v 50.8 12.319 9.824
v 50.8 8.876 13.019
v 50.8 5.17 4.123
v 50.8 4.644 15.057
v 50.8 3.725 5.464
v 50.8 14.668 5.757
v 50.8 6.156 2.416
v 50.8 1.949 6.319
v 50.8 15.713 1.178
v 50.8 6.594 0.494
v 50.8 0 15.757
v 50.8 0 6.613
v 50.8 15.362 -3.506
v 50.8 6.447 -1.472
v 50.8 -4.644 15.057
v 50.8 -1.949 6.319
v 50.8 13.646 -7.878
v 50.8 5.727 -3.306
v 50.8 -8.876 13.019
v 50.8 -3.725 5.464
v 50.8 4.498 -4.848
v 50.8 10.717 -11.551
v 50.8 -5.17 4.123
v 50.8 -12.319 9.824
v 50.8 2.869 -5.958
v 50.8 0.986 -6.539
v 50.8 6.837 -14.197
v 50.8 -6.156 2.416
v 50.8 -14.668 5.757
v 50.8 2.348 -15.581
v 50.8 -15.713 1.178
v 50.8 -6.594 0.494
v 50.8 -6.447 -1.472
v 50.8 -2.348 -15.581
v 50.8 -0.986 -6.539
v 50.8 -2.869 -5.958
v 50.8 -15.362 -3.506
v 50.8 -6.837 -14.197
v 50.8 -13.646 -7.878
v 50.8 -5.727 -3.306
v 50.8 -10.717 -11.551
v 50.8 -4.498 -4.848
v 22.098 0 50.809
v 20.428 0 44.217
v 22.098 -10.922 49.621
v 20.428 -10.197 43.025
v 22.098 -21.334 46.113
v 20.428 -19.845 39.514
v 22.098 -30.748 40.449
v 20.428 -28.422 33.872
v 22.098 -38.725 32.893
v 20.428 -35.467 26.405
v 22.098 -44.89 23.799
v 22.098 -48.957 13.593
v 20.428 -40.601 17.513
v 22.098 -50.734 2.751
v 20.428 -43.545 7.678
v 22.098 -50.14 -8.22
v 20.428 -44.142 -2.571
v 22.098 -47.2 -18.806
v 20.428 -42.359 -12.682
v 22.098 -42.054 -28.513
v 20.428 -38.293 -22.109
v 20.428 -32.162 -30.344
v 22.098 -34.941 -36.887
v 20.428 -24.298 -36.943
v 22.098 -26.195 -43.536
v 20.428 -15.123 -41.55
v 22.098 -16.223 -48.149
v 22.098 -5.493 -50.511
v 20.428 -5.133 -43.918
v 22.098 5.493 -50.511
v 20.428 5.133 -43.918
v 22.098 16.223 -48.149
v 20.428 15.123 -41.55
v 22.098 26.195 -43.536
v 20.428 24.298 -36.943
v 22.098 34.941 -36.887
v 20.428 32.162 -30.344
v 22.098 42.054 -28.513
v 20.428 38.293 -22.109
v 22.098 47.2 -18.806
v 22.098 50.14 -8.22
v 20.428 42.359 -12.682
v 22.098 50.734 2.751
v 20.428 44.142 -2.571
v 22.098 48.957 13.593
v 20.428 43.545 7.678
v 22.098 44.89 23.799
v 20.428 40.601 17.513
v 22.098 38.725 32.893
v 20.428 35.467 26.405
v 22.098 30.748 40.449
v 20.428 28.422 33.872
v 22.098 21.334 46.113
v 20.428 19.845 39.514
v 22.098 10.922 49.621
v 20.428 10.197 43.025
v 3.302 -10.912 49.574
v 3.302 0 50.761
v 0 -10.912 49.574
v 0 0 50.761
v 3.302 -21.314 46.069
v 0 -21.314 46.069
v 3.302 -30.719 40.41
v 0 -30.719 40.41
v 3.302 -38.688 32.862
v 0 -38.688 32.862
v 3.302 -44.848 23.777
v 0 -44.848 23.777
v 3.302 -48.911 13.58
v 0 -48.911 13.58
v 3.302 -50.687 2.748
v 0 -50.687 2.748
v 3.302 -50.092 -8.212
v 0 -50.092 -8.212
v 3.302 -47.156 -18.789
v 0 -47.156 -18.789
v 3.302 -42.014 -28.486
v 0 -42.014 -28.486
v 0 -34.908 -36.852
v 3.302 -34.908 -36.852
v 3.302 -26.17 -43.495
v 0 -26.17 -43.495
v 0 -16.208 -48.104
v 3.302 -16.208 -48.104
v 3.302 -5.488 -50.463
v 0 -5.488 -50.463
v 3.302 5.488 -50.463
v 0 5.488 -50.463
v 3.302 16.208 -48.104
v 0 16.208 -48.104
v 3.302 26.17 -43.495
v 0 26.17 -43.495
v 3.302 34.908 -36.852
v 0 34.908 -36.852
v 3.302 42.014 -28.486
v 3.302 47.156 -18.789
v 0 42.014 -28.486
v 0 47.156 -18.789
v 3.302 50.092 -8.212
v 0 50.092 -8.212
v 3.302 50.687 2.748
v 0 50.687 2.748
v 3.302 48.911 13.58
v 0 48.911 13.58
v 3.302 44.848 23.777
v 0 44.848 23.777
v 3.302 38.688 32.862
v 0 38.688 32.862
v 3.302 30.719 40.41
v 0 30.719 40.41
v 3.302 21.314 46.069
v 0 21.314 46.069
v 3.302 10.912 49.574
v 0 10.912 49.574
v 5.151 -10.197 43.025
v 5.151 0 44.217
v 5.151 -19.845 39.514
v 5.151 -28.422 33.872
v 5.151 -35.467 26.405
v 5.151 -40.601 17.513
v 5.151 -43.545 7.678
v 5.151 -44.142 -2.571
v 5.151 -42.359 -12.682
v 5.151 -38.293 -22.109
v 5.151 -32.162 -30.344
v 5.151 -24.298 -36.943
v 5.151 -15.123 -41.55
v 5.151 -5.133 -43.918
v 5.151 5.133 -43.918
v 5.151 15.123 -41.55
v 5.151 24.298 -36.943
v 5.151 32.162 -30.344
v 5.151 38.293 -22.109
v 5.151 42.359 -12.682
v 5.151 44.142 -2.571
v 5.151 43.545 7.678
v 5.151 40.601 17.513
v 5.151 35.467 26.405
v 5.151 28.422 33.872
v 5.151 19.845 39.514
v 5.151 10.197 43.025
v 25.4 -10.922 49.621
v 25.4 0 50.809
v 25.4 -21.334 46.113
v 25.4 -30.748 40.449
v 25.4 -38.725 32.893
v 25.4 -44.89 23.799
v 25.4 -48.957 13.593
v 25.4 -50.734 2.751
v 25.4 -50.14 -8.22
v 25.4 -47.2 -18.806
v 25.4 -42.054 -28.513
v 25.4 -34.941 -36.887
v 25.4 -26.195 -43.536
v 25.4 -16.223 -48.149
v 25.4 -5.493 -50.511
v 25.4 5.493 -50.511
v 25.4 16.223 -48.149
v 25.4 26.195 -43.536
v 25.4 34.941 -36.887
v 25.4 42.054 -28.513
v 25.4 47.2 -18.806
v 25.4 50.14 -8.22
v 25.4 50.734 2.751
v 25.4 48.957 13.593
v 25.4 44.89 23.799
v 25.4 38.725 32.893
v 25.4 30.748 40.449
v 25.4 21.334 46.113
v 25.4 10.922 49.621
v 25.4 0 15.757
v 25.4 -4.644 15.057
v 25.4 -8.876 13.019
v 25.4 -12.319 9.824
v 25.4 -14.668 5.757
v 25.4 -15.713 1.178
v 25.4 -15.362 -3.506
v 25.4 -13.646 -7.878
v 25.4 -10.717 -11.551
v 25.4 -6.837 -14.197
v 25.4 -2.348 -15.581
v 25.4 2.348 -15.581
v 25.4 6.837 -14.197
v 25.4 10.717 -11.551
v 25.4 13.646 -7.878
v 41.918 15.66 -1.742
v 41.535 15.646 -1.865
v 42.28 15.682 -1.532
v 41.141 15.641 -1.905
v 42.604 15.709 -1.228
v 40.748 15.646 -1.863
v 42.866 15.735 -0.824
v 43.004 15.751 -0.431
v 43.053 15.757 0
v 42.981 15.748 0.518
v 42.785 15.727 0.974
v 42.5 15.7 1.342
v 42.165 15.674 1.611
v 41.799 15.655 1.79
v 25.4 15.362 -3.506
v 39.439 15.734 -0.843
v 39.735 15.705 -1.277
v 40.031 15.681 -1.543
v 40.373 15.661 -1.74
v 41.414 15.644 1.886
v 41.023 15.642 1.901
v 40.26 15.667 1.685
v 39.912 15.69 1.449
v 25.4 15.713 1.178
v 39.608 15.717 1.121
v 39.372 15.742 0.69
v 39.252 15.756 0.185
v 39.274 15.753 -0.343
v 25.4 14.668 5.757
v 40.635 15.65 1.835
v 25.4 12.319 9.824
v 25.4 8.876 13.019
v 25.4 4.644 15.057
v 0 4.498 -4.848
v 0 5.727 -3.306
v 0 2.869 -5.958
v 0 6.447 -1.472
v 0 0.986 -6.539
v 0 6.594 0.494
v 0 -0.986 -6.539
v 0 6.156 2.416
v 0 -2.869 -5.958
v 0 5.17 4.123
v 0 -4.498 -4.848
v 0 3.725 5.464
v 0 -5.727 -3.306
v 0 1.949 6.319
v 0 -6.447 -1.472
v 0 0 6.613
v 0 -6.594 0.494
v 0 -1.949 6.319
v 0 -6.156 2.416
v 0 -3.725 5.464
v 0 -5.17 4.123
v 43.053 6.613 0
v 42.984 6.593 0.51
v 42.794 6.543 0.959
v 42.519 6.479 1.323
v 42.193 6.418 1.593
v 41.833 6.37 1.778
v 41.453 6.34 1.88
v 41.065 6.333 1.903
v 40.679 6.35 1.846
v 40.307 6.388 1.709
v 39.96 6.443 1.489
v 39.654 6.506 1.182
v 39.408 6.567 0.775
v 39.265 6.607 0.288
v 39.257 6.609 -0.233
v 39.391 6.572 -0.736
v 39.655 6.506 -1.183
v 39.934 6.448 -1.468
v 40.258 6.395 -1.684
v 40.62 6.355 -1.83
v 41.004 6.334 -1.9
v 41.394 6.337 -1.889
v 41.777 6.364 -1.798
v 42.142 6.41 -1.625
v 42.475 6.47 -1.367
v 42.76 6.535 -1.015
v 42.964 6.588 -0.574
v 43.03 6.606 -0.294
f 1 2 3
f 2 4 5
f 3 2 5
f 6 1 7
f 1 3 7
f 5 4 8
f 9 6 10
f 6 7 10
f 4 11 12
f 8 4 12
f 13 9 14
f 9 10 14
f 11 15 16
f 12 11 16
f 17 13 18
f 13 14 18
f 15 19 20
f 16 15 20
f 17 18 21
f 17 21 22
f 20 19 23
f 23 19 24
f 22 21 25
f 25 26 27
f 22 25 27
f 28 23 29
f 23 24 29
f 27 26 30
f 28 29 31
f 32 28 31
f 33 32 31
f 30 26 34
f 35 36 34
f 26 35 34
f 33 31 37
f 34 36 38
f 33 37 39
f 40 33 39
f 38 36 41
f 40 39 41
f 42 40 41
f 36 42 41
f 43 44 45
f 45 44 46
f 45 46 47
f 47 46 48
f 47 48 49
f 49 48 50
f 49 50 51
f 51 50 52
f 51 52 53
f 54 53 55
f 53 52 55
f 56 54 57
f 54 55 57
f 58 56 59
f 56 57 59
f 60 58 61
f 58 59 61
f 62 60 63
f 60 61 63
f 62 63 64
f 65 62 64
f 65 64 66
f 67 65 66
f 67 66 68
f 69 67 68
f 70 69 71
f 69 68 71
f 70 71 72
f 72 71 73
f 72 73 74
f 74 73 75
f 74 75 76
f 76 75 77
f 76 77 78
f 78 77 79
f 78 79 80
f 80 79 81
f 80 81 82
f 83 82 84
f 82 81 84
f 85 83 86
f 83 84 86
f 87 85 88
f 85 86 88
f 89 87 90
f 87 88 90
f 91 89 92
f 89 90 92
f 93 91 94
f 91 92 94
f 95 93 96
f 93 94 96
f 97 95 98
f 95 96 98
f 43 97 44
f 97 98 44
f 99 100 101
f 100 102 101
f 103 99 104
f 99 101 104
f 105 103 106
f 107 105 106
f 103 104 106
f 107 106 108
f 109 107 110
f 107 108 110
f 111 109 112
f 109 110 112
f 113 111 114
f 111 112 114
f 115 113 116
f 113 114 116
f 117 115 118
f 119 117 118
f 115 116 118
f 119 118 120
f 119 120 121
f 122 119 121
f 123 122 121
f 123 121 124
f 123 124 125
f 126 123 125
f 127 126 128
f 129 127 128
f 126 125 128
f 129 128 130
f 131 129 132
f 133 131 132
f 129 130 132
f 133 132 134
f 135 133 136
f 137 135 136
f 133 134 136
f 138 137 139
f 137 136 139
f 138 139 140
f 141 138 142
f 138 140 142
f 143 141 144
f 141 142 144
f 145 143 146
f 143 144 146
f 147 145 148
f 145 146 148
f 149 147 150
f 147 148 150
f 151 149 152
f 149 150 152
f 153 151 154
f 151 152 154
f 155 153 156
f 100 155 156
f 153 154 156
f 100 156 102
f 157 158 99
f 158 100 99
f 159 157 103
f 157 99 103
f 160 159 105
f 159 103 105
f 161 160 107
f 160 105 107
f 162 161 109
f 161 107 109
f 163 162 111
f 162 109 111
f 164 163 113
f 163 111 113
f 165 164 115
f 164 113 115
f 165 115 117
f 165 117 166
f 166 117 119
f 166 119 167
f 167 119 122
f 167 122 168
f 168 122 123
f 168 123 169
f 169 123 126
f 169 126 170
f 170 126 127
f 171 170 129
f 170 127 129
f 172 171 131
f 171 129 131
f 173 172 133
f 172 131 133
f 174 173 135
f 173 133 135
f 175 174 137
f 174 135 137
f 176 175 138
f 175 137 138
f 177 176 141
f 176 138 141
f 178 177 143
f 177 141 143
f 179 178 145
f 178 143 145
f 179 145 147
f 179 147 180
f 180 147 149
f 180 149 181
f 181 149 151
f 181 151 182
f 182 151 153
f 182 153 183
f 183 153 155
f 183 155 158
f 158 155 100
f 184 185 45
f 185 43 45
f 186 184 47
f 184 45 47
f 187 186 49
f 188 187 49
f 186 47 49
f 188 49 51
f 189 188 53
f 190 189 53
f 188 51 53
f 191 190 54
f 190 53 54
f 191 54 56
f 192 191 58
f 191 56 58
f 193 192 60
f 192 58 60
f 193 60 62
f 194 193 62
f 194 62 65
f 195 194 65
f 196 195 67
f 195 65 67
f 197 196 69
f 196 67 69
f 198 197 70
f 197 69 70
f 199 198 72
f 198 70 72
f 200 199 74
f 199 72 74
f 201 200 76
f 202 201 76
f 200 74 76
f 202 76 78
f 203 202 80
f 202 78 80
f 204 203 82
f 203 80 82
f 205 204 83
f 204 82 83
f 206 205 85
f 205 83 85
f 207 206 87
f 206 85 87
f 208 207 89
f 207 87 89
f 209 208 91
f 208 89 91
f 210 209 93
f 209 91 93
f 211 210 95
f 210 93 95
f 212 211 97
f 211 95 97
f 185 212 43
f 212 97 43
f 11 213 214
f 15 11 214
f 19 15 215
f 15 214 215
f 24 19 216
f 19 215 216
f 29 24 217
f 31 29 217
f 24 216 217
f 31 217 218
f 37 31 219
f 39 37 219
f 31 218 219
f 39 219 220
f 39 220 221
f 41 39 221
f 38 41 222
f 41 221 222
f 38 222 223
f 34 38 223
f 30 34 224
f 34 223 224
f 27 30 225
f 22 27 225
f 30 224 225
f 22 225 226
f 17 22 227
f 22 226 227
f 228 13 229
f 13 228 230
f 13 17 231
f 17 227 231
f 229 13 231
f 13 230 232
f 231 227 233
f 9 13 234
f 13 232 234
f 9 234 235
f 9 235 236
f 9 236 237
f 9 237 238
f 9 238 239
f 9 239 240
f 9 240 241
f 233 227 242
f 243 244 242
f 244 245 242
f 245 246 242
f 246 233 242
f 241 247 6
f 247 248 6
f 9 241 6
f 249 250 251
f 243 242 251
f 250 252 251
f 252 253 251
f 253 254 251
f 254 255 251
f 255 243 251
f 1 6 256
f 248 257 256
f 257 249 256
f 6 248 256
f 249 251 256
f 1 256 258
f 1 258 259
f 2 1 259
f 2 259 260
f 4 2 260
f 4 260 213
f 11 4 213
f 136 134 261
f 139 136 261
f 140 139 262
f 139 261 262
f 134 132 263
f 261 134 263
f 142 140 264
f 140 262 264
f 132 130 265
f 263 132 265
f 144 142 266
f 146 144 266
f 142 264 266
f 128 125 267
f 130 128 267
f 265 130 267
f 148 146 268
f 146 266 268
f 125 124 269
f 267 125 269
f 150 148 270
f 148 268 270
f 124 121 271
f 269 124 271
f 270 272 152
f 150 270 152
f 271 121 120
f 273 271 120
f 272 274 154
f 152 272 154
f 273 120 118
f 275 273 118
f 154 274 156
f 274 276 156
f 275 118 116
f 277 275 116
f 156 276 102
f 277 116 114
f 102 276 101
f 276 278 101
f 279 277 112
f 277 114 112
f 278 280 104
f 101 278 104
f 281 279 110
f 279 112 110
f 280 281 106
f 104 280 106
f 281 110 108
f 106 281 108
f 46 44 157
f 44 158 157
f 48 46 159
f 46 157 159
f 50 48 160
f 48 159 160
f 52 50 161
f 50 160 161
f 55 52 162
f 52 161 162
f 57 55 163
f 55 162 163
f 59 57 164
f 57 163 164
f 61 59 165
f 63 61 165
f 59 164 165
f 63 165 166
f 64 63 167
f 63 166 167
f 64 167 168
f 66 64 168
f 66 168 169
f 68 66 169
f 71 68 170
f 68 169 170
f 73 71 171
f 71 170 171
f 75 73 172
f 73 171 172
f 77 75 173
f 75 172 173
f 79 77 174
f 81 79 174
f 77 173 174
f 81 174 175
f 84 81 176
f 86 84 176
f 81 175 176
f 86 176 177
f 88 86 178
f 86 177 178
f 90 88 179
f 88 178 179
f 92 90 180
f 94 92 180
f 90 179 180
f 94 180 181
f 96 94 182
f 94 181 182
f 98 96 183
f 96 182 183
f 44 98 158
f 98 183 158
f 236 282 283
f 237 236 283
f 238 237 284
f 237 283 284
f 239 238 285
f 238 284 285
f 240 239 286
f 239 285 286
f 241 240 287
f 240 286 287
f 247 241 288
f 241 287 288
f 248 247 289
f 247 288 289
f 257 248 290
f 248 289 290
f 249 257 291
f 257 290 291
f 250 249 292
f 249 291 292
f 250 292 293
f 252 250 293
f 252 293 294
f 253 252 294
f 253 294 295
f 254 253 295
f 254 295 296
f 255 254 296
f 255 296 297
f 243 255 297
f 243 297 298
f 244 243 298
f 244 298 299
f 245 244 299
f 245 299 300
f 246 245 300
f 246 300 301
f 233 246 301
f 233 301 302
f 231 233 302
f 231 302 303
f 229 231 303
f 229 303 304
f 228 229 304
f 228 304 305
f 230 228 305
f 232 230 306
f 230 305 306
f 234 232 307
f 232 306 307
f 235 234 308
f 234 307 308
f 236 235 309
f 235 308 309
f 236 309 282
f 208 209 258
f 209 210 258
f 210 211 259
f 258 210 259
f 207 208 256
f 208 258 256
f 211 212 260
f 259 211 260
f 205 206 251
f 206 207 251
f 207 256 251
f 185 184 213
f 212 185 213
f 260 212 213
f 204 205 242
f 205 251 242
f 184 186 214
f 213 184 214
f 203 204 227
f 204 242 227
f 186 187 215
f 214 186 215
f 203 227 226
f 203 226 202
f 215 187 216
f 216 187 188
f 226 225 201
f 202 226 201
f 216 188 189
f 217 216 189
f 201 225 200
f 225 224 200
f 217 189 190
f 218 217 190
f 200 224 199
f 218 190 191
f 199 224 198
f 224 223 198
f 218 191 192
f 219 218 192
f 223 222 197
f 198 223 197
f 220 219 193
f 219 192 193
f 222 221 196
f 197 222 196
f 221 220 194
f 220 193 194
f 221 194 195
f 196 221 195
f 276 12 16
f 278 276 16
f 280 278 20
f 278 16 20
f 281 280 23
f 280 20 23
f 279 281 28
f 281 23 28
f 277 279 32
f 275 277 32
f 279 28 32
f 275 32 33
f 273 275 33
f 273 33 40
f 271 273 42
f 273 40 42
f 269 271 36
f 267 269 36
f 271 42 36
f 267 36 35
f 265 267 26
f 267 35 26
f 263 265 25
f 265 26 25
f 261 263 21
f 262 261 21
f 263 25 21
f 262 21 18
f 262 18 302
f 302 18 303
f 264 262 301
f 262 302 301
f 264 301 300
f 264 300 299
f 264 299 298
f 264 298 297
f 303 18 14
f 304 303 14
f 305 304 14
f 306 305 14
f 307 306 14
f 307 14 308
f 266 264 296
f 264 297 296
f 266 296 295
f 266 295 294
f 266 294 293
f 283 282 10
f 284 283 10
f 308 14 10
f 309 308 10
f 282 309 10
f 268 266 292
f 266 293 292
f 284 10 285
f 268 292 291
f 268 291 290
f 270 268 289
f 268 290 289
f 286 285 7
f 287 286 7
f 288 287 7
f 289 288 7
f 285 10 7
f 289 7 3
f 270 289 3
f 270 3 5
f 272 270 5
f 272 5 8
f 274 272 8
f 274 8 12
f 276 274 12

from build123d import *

# Parameters (mm, degrees)
F2_R     = 1.905
F3_DEPTH = 25.4


with BuildPart() as f1:
    # F0 (on Front) → F1 (revolve)
    with BuildSketch(Plane.XZ):
        Polygon((0, 50.761004), (0, 6.612969), (50.8, 6.612969), (50.8, 15.756969), (25.4, 15.756969), (25.4, 50.808969), (22.098, 50.808969), (20.42762, 44.217008), (5.151389, 44.217008), (3.302, 50.761004), align=None)
    revolve(axis=Axis((50.224784, 0, 0), (1, 0, 0)))

    # F2 (on Front) → F3 (cut)
    with BuildSketch(Plane.XZ):
        with Locations((41.148, 0)):
            Circle(F2_R)
    extrude(amount=-F3_DEPTH, mode=Mode.SUBTRACT)


solid = f1.part
